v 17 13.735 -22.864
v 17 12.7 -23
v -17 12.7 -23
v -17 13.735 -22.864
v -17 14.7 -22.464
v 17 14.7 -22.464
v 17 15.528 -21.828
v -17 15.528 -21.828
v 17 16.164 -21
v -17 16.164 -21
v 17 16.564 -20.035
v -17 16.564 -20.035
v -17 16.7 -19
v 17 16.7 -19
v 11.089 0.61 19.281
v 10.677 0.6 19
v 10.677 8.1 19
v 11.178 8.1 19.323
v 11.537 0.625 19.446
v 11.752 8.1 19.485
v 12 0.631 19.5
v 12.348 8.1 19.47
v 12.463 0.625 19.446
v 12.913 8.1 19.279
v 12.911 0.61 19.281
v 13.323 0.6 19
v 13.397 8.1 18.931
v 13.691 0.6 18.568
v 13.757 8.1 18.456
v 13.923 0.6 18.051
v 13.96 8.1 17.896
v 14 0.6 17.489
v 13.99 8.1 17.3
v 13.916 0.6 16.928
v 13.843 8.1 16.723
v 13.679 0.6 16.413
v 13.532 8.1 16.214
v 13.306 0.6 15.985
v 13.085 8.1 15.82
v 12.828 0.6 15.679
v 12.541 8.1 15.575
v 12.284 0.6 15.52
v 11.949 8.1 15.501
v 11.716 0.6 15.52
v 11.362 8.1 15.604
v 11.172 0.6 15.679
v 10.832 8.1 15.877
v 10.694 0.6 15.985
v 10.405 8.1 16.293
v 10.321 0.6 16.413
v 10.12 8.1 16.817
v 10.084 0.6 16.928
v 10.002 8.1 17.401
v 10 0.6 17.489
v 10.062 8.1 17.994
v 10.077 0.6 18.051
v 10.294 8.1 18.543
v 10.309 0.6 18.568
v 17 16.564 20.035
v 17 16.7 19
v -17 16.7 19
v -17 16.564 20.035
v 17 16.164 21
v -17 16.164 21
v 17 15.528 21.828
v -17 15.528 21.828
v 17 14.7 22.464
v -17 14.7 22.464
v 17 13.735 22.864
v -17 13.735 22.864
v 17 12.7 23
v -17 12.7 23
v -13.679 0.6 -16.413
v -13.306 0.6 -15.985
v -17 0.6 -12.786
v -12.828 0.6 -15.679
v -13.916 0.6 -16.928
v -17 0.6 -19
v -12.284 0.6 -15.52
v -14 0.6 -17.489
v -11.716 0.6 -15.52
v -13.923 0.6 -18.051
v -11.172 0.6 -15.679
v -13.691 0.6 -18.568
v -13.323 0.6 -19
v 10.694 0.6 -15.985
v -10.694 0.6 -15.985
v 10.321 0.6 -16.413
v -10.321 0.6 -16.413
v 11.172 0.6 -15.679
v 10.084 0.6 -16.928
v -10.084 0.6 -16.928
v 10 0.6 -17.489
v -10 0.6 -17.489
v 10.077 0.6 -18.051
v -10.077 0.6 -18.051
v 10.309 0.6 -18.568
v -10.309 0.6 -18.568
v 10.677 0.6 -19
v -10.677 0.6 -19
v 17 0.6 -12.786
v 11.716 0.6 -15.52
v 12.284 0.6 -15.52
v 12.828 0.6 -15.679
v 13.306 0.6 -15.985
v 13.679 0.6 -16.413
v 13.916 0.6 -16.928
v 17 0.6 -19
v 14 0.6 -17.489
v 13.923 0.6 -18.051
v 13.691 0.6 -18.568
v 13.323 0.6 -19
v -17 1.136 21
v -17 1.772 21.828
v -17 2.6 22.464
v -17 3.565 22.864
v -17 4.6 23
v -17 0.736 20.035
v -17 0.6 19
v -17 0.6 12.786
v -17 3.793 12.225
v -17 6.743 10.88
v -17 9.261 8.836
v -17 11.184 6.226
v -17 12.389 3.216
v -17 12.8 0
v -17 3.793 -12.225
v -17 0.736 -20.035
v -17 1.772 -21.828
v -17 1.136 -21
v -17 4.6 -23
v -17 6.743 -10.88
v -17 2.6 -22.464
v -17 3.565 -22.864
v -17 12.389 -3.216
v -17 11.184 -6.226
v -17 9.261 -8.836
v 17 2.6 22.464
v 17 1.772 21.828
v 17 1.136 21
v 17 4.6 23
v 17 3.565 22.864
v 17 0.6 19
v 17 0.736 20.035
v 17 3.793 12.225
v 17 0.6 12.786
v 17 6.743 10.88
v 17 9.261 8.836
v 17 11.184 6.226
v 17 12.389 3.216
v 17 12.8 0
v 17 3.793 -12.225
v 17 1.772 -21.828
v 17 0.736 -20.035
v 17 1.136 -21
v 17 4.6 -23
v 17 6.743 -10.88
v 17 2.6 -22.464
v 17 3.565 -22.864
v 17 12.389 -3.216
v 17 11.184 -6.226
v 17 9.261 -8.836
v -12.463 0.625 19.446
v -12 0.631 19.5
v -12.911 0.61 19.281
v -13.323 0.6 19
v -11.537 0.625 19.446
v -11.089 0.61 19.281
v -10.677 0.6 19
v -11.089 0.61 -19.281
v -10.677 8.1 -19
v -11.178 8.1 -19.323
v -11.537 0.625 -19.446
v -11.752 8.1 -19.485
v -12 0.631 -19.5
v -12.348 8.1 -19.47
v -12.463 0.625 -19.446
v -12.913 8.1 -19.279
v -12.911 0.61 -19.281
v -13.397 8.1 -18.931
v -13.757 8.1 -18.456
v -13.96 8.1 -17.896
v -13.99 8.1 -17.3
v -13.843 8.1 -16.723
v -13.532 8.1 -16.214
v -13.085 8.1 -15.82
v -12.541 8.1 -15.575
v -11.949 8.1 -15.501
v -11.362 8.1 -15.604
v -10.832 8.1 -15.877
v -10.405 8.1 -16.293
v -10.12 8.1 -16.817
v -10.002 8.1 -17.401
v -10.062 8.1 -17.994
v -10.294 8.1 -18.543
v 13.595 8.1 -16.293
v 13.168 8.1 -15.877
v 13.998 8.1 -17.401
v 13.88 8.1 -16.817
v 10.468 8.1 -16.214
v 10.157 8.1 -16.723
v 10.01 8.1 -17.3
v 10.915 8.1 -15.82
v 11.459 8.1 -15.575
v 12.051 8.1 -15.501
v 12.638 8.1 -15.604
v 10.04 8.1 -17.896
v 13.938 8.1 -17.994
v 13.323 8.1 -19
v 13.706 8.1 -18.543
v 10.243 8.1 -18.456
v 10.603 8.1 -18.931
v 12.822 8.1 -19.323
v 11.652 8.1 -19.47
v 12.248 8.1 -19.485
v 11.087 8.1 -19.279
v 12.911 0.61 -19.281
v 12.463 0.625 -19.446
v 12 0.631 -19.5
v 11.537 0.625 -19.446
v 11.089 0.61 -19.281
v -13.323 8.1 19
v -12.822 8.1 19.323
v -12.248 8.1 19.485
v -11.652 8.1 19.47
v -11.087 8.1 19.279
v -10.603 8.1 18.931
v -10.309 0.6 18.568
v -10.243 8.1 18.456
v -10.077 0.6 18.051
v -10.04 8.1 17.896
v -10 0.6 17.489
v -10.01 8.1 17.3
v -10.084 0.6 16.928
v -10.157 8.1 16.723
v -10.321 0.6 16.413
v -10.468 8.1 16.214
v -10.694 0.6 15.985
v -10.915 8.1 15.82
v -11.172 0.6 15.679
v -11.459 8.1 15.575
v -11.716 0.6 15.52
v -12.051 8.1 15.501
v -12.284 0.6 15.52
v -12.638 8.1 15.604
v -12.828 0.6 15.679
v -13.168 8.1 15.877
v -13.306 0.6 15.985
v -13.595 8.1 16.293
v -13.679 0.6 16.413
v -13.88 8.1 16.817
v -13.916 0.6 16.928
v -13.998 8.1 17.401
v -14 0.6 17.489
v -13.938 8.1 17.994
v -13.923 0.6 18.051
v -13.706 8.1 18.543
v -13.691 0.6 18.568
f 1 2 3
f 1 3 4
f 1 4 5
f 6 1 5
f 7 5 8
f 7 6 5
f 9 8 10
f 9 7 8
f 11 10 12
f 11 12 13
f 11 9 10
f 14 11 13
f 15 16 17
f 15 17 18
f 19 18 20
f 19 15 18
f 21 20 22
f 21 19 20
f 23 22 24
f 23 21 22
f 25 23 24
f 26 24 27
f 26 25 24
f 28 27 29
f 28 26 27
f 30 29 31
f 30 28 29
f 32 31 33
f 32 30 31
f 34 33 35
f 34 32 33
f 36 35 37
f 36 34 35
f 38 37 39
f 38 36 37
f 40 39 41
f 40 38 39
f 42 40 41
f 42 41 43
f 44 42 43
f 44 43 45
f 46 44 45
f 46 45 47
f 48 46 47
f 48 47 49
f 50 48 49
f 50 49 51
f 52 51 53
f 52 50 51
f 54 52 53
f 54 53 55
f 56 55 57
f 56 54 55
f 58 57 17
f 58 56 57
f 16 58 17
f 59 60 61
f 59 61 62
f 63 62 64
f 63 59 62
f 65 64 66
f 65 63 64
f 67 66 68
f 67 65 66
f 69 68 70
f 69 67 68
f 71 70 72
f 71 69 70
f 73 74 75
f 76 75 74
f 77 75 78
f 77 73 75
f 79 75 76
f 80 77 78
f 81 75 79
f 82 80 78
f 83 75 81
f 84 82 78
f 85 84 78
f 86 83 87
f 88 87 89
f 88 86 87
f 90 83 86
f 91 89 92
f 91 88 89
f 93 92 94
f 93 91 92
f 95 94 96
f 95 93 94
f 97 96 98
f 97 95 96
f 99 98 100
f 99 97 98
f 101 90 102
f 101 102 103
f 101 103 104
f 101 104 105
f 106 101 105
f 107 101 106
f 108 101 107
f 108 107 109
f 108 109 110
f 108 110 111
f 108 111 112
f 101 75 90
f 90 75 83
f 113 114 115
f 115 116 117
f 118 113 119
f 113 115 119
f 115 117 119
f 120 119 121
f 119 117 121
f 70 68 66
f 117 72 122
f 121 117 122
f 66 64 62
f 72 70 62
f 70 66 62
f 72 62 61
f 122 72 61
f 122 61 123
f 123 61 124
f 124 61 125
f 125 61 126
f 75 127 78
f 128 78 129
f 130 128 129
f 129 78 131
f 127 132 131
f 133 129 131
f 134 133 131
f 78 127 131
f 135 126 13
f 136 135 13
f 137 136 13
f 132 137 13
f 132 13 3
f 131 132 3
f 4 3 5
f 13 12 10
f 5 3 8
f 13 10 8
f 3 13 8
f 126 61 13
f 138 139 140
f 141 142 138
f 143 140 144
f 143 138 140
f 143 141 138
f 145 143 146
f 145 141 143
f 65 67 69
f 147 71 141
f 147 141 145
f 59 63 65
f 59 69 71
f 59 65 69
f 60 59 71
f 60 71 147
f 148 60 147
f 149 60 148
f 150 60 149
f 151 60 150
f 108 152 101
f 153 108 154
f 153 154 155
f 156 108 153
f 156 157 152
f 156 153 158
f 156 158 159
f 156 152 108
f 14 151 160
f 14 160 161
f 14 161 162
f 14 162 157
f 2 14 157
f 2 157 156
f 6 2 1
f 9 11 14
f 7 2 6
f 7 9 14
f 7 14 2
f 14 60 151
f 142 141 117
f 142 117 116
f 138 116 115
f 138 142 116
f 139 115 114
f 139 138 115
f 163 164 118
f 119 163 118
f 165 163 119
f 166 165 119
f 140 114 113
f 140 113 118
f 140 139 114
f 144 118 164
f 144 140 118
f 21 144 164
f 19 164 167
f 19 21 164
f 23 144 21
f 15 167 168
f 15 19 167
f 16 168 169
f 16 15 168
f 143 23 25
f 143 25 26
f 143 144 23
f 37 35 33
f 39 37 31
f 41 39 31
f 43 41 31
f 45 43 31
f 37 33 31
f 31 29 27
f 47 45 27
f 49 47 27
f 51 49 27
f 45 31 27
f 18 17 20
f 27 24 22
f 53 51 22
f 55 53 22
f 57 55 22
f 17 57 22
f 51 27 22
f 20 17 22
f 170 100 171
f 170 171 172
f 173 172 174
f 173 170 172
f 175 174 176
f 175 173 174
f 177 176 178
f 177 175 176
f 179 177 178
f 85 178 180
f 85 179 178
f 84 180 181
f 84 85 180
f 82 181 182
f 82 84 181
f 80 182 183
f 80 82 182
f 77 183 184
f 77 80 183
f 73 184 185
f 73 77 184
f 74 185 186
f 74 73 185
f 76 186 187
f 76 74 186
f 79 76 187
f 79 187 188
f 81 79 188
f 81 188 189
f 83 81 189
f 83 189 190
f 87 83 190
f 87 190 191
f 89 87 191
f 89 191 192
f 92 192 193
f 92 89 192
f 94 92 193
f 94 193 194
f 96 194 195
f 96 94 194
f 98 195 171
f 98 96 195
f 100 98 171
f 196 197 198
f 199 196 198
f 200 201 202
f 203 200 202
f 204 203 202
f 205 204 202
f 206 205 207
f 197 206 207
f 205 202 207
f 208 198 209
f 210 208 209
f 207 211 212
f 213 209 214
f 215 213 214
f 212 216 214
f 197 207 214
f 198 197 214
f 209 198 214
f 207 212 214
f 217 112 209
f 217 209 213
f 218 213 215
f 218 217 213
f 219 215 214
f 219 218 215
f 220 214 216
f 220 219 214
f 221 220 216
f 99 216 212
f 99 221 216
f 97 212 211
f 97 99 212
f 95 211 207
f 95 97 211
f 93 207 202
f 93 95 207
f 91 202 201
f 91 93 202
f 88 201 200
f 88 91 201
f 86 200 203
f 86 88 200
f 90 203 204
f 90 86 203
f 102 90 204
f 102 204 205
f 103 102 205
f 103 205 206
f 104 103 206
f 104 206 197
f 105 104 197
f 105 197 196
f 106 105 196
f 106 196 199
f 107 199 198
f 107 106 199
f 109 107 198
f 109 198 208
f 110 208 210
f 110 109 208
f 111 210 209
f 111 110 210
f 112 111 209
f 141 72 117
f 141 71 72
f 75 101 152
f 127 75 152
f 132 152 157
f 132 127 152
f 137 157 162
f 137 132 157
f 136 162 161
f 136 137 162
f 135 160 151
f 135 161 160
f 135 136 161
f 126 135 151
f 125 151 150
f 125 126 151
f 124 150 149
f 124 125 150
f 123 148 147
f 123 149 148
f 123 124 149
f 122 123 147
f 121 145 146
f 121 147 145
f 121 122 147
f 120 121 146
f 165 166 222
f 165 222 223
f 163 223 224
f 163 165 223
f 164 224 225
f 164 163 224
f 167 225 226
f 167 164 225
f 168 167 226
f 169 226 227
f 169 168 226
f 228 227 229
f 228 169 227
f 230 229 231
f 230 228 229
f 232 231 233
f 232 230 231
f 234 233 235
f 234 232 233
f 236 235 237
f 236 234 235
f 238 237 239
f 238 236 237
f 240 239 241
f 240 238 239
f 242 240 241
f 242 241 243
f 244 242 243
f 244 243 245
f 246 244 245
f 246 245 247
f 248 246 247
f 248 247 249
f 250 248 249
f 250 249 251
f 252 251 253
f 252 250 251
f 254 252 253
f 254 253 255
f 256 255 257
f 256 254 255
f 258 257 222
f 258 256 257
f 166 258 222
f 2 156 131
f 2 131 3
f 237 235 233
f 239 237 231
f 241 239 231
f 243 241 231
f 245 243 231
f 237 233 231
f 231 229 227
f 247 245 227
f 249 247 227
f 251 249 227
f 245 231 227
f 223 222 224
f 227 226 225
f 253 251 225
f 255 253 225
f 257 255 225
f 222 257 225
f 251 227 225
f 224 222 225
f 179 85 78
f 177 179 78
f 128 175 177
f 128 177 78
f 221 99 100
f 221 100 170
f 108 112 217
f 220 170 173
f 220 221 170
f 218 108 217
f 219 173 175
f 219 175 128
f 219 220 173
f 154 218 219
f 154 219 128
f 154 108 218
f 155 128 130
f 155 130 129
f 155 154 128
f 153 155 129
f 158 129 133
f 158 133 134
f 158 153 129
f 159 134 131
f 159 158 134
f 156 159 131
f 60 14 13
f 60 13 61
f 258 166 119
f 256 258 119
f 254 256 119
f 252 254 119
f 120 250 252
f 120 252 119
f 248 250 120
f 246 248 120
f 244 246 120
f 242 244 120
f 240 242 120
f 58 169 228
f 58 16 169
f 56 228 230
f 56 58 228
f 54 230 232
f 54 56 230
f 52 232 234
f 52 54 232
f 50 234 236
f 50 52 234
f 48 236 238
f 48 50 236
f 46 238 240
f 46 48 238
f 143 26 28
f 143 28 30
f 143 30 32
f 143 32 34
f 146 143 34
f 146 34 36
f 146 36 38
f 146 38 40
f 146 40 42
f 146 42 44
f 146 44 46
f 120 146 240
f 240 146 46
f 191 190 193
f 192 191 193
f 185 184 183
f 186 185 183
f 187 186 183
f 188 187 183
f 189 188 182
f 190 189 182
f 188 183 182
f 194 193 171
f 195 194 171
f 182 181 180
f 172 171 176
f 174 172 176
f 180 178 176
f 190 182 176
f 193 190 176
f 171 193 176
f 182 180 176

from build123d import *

# Parameters (mm, degrees)
BOSS_EXTRUDE1_DEPTH     = 17
CUT_EXTRUDE1_DEPTH      = 34.119329703
CUT_EXTRUDE1_DEPTH_BACK = 34.119329703
SKETCH2_R               = 12.8
SKETCH3_R               = 2
CUT_EXTRUDE2_DEPTH      = 7.5


with BuildPart() as part:
    # Sketch1 → Boss-Extrude1 (new, symmetric)
    with BuildSketch(Plane(origin=(0, 0, 0), x_dir=(0, 0, -1), z_dir=(1, 0, 0))):
        with BuildLine():
            Line((-19, 0.6), (19, 0.6))
            ThreePointArc((19, 0.6), (21.828427125, 1.771572875), (23, 4.6))
            Line((23, 4.6), (23, 12.7))
            ThreePointArc((23, 12.7), (21.828427125, 15.528427125), (19, 16.7))
            Line((19, 16.7), (-19, 16.7))
            ThreePointArc((-19, 16.7), (-21.828427125, 15.528427125), (-23, 12.7))
            Line((-23, 12.7), (-23, 4.6))
            ThreePointArc((-23, 4.6), (-21.828427125, 1.771572875), (-19, 0.6))
        make_face()
    extrude(amount=BOSS_EXTRUDE1_DEPTH, both=True)

    # Sketch2 → Cut-Extrude1 (cut, two sides: drawn at the far end of the back side and taken through both)
    with BuildSketch(Plane(origin=(0, 0, 0), x_dir=(0, 0, -1), z_dir=(1, 0, 0)).offset(-CUT_EXTRUDE1_DEPTH_BACK)):
        Circle(SKETCH2_R)
    extrude(amount=CUT_EXTRUDE1_DEPTH + CUT_EXTRUDE1_DEPTH_BACK, mode=Mode.SUBTRACT)

    # Sketch3 → Cut-Extrude2 (cut)
    with BuildSketch(Plane(origin=(0, 0.6, 0), x_dir=(1, 0, 0), z_dir=(0, 1, 0))):
        with Locations(Location((12, -17.5, 0), (0, 0, 228.590377891))):
            Circle(SKETCH3_R)
        with Locations(Location((12, 17.5, 0), (0, 0, 48.590377891))):
            Circle(SKETCH3_R)
        with Locations(Location((-12, -17.5, 0), (0, 0, 228.590377891))):
            Circle(SKETCH3_R)
        with Locations(Location((-12, 17.5, 0), (0, 0, 48.590377891))):
            Circle(SKETCH3_R)
    extrude(amount=CUT_EXTRUDE2_DEPTH, mode=Mode.SUBTRACT)


solid = part.part
